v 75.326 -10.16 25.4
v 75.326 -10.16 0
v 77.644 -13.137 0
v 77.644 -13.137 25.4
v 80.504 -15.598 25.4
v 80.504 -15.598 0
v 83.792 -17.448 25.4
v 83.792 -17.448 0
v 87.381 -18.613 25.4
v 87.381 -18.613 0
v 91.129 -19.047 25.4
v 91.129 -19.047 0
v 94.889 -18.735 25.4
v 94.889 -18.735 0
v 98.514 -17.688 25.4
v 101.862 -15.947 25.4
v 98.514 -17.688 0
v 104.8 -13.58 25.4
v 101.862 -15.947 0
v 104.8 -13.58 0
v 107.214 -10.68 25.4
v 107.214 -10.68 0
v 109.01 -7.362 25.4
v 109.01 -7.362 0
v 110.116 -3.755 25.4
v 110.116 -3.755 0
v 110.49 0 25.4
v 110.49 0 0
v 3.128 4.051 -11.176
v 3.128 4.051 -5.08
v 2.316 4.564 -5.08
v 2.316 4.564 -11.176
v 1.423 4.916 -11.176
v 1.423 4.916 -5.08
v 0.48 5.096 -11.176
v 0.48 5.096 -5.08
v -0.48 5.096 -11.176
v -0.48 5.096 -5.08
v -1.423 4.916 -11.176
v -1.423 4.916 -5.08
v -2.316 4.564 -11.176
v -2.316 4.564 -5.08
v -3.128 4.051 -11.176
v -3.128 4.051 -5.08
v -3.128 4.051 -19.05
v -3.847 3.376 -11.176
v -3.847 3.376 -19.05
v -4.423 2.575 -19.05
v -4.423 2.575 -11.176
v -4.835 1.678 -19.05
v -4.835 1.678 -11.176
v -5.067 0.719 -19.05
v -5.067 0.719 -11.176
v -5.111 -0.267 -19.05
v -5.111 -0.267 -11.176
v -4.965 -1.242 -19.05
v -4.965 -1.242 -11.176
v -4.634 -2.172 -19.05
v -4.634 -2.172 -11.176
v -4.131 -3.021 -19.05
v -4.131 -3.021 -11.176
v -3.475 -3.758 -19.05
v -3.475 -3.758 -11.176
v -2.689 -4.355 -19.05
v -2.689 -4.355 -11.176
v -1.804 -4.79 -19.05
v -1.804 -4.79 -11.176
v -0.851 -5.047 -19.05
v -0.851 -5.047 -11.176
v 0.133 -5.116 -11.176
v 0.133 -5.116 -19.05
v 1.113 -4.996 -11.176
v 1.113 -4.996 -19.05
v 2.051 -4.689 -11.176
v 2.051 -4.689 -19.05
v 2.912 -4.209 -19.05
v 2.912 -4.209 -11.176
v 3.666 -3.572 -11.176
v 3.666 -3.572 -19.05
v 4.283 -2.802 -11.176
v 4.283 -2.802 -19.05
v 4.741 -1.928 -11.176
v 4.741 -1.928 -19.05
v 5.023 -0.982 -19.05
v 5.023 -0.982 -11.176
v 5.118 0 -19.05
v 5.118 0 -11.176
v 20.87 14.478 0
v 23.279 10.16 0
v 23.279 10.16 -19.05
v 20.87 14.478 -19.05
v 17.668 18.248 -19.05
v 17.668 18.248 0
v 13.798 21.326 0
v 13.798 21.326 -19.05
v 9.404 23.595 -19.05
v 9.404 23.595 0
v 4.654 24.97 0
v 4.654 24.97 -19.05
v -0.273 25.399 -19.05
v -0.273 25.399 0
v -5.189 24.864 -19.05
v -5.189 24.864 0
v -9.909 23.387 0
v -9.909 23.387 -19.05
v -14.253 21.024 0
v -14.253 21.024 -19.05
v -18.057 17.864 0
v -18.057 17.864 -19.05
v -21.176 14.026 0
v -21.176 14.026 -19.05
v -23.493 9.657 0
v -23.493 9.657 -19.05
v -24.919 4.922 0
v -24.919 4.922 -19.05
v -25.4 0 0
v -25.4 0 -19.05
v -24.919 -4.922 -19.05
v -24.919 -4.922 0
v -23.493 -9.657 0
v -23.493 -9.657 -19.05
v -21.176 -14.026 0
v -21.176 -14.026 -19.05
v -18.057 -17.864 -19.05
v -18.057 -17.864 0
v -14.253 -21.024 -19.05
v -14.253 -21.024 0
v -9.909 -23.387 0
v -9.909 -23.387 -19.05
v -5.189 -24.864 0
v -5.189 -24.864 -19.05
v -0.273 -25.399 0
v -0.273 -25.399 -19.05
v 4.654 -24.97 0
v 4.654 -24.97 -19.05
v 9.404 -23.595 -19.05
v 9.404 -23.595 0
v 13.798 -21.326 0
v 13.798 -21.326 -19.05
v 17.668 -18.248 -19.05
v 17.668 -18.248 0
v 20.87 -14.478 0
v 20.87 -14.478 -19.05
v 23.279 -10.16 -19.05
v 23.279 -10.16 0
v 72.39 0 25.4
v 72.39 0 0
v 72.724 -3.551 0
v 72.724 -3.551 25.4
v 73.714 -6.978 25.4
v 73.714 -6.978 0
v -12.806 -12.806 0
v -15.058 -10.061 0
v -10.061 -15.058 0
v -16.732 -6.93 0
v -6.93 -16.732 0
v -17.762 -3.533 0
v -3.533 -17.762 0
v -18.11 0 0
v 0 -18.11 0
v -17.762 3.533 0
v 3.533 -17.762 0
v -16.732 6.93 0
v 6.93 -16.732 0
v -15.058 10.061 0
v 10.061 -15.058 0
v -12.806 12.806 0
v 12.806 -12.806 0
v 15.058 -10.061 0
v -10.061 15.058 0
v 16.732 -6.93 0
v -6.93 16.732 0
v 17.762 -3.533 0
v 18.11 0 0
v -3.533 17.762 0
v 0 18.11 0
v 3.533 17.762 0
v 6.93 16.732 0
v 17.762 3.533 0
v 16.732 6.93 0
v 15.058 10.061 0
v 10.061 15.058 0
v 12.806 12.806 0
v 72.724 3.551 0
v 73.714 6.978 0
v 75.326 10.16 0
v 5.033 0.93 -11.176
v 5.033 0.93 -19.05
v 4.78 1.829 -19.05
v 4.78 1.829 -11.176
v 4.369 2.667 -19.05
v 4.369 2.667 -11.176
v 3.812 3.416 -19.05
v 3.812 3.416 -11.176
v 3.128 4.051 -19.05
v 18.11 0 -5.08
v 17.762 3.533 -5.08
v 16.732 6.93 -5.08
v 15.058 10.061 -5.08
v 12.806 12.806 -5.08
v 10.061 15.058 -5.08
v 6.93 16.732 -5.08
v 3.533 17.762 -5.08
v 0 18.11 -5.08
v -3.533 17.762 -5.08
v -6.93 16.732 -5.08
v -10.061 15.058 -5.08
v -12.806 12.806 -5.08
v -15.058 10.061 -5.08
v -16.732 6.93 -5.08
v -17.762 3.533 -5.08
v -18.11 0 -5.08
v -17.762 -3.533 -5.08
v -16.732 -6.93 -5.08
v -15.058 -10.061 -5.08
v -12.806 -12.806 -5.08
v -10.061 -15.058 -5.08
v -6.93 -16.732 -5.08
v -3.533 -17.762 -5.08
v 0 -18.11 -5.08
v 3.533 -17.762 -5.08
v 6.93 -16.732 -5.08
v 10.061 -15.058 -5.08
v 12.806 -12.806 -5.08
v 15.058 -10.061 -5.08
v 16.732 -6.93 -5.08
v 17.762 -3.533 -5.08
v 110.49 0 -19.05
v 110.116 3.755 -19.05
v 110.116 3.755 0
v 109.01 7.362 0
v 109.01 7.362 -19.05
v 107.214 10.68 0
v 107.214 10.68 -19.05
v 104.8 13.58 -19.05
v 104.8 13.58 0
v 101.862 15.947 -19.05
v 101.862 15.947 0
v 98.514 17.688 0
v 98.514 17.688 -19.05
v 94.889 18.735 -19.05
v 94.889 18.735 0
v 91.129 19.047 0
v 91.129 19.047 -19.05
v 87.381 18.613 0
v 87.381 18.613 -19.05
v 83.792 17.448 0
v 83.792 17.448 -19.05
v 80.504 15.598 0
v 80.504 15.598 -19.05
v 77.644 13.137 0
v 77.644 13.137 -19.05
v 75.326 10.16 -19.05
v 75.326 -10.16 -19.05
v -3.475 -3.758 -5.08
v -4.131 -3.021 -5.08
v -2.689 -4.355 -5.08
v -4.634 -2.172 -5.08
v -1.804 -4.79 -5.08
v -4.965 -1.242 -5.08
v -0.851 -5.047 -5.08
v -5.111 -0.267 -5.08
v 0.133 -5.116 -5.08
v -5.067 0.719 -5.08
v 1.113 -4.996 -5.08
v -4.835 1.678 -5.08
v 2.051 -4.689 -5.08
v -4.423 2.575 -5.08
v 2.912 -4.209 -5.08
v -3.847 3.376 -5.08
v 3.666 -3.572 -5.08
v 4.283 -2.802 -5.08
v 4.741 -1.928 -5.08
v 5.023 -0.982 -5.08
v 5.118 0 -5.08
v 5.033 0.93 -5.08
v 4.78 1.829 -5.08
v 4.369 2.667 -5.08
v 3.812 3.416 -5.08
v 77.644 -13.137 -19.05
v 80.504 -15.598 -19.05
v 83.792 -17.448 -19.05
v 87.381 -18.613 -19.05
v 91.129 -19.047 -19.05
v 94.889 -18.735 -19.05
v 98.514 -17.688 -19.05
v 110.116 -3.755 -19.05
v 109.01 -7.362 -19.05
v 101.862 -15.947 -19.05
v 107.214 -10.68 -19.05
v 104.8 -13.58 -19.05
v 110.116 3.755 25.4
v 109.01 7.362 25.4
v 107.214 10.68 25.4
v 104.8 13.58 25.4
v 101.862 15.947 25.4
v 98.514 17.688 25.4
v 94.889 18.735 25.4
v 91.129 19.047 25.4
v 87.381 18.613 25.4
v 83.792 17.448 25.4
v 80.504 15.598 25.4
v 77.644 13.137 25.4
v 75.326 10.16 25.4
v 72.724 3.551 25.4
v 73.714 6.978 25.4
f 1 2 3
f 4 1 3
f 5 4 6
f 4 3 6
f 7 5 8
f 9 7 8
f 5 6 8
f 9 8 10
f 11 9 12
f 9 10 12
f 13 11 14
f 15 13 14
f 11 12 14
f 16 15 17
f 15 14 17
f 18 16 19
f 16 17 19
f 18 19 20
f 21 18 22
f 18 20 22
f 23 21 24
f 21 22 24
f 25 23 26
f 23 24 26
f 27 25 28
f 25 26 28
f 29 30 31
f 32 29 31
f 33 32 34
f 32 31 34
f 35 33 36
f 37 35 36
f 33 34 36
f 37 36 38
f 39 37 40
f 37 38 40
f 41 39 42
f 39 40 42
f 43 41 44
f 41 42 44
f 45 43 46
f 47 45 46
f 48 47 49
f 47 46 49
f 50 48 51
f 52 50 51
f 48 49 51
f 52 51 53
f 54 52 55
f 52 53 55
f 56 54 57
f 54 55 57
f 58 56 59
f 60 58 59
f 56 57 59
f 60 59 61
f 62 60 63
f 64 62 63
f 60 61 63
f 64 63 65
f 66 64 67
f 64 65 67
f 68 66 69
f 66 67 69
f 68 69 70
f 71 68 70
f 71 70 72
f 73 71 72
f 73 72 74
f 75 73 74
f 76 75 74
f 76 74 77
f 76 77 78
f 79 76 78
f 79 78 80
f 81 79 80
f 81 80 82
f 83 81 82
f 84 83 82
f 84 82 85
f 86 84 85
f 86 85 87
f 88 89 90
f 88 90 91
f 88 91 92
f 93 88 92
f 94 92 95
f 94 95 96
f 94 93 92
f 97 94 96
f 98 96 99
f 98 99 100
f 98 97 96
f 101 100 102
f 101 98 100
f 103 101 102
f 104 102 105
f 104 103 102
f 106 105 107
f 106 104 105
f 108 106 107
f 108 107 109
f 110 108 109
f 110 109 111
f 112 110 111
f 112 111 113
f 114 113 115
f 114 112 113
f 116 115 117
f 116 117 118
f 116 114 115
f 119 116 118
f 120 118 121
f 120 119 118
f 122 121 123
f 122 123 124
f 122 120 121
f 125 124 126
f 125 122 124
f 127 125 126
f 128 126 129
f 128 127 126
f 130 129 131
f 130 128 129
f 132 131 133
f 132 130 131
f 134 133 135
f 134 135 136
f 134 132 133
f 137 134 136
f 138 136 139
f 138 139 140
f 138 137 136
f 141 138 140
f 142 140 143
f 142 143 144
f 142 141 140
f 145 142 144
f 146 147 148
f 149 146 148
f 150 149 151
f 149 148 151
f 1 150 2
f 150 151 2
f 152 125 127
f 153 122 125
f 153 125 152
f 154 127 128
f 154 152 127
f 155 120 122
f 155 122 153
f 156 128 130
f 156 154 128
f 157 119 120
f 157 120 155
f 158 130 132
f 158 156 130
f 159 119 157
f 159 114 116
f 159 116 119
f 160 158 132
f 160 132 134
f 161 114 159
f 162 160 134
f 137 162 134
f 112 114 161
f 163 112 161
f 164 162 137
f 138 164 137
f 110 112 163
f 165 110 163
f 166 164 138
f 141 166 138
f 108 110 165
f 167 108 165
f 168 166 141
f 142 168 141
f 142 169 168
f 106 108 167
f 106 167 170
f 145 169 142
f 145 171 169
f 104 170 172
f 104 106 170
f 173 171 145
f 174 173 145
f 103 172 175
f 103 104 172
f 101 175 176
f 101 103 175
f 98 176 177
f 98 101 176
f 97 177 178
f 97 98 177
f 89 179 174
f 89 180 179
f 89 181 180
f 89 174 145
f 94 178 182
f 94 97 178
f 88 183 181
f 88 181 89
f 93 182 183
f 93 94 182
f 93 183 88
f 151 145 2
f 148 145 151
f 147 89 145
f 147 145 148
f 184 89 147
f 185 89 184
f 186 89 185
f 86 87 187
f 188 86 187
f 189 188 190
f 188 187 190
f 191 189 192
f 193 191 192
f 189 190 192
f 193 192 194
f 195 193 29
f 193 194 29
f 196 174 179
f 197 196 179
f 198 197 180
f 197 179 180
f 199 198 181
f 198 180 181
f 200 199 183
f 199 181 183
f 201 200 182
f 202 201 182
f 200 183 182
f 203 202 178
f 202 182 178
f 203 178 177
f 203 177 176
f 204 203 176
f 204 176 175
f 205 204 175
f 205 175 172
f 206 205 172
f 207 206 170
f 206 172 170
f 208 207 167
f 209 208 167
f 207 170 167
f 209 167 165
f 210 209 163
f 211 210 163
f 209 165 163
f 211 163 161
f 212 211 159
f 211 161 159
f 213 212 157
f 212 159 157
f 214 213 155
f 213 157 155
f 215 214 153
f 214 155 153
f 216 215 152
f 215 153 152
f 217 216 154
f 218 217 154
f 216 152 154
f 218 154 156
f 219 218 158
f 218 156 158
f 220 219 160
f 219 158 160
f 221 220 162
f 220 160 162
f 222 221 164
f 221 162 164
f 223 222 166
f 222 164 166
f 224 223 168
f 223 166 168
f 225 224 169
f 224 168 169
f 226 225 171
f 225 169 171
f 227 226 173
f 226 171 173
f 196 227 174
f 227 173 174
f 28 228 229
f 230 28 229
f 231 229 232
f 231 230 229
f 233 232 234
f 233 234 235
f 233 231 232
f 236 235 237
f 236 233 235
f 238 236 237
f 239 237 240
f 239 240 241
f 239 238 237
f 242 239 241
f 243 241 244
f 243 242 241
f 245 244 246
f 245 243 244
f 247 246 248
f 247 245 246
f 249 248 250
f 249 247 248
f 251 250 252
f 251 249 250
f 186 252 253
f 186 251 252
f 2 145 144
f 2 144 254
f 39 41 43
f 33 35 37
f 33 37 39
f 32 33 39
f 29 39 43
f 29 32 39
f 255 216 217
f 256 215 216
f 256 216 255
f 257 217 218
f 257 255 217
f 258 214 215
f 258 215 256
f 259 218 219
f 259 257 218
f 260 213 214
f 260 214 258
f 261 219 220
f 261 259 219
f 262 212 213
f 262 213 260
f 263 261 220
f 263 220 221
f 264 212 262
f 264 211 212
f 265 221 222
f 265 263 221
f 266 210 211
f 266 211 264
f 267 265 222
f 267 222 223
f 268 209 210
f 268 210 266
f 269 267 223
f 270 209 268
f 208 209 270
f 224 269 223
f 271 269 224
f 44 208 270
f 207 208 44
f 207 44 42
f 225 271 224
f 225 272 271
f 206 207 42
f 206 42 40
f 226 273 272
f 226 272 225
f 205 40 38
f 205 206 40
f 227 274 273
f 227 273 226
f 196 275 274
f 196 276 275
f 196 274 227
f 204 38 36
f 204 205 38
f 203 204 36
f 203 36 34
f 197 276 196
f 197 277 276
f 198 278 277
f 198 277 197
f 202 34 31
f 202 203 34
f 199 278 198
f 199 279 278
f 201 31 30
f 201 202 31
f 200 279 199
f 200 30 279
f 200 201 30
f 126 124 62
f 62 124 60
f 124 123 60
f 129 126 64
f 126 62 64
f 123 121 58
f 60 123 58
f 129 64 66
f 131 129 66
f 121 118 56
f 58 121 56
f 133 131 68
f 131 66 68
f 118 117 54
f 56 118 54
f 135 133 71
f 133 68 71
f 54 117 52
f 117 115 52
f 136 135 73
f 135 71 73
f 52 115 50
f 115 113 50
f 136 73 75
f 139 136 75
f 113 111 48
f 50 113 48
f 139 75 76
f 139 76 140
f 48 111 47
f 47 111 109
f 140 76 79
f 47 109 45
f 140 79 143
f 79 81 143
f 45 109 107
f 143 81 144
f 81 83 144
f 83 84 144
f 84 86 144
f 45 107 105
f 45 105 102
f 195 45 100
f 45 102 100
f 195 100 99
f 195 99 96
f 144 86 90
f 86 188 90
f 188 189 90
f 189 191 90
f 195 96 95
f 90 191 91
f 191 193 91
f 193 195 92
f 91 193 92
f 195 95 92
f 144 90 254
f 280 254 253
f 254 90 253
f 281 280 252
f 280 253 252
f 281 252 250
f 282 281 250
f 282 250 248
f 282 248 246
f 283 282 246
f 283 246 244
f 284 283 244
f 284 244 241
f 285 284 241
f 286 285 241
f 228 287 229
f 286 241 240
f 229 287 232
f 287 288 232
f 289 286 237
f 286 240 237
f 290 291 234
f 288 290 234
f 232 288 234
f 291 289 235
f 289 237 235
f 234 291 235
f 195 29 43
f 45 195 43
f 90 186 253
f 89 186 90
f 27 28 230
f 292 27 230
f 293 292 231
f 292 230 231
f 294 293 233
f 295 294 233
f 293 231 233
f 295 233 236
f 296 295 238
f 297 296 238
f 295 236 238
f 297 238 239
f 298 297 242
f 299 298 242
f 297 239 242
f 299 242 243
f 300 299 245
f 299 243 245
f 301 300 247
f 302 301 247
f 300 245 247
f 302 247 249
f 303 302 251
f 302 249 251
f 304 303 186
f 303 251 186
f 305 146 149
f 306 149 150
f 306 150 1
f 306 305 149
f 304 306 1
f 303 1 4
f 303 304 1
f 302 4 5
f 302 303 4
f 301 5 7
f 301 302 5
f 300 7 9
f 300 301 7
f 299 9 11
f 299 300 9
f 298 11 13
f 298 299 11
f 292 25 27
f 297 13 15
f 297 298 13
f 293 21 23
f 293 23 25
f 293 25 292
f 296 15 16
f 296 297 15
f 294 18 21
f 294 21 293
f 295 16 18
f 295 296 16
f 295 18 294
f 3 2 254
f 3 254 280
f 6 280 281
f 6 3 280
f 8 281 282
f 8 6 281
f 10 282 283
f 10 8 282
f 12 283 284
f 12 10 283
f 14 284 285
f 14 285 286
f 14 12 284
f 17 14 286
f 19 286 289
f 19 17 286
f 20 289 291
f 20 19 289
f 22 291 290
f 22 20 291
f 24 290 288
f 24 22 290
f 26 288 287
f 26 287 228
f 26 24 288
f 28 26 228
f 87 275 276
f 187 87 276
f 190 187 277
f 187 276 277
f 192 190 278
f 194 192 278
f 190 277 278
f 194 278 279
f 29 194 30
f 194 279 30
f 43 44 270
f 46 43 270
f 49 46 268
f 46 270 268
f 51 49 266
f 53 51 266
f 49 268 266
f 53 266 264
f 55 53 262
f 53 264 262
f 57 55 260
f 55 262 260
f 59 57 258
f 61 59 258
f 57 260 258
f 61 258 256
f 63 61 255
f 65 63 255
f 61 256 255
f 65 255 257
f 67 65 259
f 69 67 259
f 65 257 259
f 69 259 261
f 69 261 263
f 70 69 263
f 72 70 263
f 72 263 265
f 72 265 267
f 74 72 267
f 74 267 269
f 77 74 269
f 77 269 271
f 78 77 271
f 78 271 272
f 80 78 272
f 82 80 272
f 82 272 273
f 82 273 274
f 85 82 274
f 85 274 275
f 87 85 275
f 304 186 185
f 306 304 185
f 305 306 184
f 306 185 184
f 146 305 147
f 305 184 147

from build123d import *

# Parameters (mm, degrees)
F0_R     = 18.1102
F1_DEPTH = 19.05
F2_DEPTH = 25.4
F3_DEPTH = 5.08
F4_DEPTH = 11.176
F5_DEPTH = 20.32


with BuildPart() as f1:
    # F0 (on Top) → F1 (new body)
    with BuildSketch(Plane.XY):
        with BuildLine():
            ThreePointArc((23.279485, -10.16), (24.86422, -5.189465), (25.4, 0))
            ThreePointArc((25.4, 0), (24.86422, 5.189465), (23.279485, 10.16))
            ThreePointArc((23.279485, 10.16), (-25.4, 0), (23.279485, -10.16))
        make_face()
        Circle(F0_R, mode=Mode.SUBTRACT)
        Circle(F0_R)
        with BuildLine():
            ThreePointArc((3.127605, 4.0513), (4.593601, 2.256939), (5.1181, 0))
            ThreePointArc((5.1181, 0), (-2.256939, -4.593601), (-3.127605, 4.0513))
            ThreePointArc((-3.127605, 4.0513), (0, 5.1181), (3.127605, 4.0513))
        make_face(mode=Mode.SUBTRACT)
        with BuildLine():
            ThreePointArc((-3.127605, 4.0513), (-2.256939, -4.593601), (5.1181, 0))
            ThreePointArc((5.1181, 0), (4.593601, 2.256939), (3.127605, 4.0513))
            Line((3.127605, 4.0513), (-3.127605, 4.0513))
        make_face()
        with BuildLine():
            Line((-3.127605, 4.0513), (3.127605, 4.0513))
            ThreePointArc((3.127605, 4.0513), (0, 5.1181), (-3.127605, 4.0513))
        make_face()
        with BuildLine():
            Line((72.39, 0), (25.4, 0))
            ThreePointArc((25.4, 0), (24.86422, -5.189465), (23.279485, -10.16))
            Line((23.279485, -10.16), (75.325507, -10.16))
            ThreePointArc((75.325507, -10.16), (73.138585, -5.287788), (72.39, 0))
        make_face()
        with BuildLine():
            ThreePointArc((23.279485, 10.16), (24.86422, 5.189465), (25.4, 0))
            Line((25.4, 0), (72.39, 0))
            ThreePointArc((72.39, 0), (73.138585, 5.287788), (75.325507, 10.16))
            Line((75.325507, 10.16), (23.279485, 10.16))
        make_face()
        with BuildLine():
            ThreePointArc((75.325507, 10.16), (73.138585, 5.287788), (72.39, 0))
            ThreePointArc((72.39, 0), (73.138585, -5.287788), (75.325507, -10.16))
            ThreePointArc((75.325507, -10.16), (96.727788, -18.301415), (110.49, 0))
            ThreePointArc((110.49, 0), (96.727788, 18.301415), (75.325507, 10.16))
        make_face()
    extrude(amount=-F1_DEPTH)

    # F0 (on Top) → F2 (join)
    with BuildSketch(Plane.XY):
        with BuildLine():
            ThreePointArc((75.325507, 10.16), (73.138585, 5.287788), (72.39, 0))
            ThreePointArc((72.39, 0), (73.138585, -5.287788), (75.325507, -10.16))
            ThreePointArc((75.325507, -10.16), (96.727788, -18.301415), (110.49, 0))
            ThreePointArc((110.49, 0), (96.727788, 18.301415), (75.325507, 10.16))
        make_face()
    extrude(amount=F2_DEPTH)

    # F0 (on Top) → F3 (cut)
    with BuildSketch(Plane.XY):
        Circle(F0_R)
        with BuildLine():
            ThreePointArc((3.127605, 4.0513), (4.593601, 2.256939), (5.1181, 0))
            ThreePointArc((5.1181, 0), (-2.256939, -4.593601), (-3.127605, 4.0513))
            ThreePointArc((-3.127605, 4.0513), (0, 5.1181), (3.127605, 4.0513))
        make_face(mode=Mode.SUBTRACT)
        with BuildLine():
            ThreePointArc((-3.127605, 4.0513), (-2.256939, -4.593601), (5.1181, 0))
            ThreePointArc((5.1181, 0), (4.593601, 2.256939), (3.127605, 4.0513))
            Line((3.127605, 4.0513), (-3.127605, 4.0513))
        make_face()
        with BuildLine():
            Line((-3.127605, 4.0513), (3.127605, 4.0513))
            ThreePointArc((3.127605, 4.0513), (0, 5.1181), (-3.127605, 4.0513))
        make_face()
    extrude(amount=-F3_DEPTH, mode=Mode.SUBTRACT)

    # F0 (on Top) → F4 (cut)
    with BuildSketch(Plane.XY):
        with BuildLine():
            ThreePointArc((-3.127605, 4.0513), (-2.256939, -4.593601), (5.1181, 0))
            ThreePointArc((5.1181, 0), (4.593601, 2.256939), (3.127605, 4.0513))
            Line((3.127605, 4.0513), (-3.127605, 4.0513))
        make_face()
        with BuildLine():
            Line((-3.127605, 4.0513), (3.127605, 4.0513))
            ThreePointArc((3.127605, 4.0513), (0, 5.1181), (-3.127605, 4.0513))
        make_face()
    extrude(amount=-F4_DEPTH, mode=Mode.SUBTRACT)

    # F0 (on Top) → F5 (cut)
    with BuildSketch(Plane.XY):
        with BuildLine():
            ThreePointArc((-3.127605, 4.0513), (-2.256939, -4.593601), (5.1181, 0))
            ThreePointArc((5.1181, 0), (4.593601, 2.256939), (3.127605, 4.0513))
            Line((3.127605, 4.0513), (-3.127605, 4.0513))
        make_face()
    extrude(amount=-F5_DEPTH, mode=Mode.SUBTRACT)


solid = f1.part
